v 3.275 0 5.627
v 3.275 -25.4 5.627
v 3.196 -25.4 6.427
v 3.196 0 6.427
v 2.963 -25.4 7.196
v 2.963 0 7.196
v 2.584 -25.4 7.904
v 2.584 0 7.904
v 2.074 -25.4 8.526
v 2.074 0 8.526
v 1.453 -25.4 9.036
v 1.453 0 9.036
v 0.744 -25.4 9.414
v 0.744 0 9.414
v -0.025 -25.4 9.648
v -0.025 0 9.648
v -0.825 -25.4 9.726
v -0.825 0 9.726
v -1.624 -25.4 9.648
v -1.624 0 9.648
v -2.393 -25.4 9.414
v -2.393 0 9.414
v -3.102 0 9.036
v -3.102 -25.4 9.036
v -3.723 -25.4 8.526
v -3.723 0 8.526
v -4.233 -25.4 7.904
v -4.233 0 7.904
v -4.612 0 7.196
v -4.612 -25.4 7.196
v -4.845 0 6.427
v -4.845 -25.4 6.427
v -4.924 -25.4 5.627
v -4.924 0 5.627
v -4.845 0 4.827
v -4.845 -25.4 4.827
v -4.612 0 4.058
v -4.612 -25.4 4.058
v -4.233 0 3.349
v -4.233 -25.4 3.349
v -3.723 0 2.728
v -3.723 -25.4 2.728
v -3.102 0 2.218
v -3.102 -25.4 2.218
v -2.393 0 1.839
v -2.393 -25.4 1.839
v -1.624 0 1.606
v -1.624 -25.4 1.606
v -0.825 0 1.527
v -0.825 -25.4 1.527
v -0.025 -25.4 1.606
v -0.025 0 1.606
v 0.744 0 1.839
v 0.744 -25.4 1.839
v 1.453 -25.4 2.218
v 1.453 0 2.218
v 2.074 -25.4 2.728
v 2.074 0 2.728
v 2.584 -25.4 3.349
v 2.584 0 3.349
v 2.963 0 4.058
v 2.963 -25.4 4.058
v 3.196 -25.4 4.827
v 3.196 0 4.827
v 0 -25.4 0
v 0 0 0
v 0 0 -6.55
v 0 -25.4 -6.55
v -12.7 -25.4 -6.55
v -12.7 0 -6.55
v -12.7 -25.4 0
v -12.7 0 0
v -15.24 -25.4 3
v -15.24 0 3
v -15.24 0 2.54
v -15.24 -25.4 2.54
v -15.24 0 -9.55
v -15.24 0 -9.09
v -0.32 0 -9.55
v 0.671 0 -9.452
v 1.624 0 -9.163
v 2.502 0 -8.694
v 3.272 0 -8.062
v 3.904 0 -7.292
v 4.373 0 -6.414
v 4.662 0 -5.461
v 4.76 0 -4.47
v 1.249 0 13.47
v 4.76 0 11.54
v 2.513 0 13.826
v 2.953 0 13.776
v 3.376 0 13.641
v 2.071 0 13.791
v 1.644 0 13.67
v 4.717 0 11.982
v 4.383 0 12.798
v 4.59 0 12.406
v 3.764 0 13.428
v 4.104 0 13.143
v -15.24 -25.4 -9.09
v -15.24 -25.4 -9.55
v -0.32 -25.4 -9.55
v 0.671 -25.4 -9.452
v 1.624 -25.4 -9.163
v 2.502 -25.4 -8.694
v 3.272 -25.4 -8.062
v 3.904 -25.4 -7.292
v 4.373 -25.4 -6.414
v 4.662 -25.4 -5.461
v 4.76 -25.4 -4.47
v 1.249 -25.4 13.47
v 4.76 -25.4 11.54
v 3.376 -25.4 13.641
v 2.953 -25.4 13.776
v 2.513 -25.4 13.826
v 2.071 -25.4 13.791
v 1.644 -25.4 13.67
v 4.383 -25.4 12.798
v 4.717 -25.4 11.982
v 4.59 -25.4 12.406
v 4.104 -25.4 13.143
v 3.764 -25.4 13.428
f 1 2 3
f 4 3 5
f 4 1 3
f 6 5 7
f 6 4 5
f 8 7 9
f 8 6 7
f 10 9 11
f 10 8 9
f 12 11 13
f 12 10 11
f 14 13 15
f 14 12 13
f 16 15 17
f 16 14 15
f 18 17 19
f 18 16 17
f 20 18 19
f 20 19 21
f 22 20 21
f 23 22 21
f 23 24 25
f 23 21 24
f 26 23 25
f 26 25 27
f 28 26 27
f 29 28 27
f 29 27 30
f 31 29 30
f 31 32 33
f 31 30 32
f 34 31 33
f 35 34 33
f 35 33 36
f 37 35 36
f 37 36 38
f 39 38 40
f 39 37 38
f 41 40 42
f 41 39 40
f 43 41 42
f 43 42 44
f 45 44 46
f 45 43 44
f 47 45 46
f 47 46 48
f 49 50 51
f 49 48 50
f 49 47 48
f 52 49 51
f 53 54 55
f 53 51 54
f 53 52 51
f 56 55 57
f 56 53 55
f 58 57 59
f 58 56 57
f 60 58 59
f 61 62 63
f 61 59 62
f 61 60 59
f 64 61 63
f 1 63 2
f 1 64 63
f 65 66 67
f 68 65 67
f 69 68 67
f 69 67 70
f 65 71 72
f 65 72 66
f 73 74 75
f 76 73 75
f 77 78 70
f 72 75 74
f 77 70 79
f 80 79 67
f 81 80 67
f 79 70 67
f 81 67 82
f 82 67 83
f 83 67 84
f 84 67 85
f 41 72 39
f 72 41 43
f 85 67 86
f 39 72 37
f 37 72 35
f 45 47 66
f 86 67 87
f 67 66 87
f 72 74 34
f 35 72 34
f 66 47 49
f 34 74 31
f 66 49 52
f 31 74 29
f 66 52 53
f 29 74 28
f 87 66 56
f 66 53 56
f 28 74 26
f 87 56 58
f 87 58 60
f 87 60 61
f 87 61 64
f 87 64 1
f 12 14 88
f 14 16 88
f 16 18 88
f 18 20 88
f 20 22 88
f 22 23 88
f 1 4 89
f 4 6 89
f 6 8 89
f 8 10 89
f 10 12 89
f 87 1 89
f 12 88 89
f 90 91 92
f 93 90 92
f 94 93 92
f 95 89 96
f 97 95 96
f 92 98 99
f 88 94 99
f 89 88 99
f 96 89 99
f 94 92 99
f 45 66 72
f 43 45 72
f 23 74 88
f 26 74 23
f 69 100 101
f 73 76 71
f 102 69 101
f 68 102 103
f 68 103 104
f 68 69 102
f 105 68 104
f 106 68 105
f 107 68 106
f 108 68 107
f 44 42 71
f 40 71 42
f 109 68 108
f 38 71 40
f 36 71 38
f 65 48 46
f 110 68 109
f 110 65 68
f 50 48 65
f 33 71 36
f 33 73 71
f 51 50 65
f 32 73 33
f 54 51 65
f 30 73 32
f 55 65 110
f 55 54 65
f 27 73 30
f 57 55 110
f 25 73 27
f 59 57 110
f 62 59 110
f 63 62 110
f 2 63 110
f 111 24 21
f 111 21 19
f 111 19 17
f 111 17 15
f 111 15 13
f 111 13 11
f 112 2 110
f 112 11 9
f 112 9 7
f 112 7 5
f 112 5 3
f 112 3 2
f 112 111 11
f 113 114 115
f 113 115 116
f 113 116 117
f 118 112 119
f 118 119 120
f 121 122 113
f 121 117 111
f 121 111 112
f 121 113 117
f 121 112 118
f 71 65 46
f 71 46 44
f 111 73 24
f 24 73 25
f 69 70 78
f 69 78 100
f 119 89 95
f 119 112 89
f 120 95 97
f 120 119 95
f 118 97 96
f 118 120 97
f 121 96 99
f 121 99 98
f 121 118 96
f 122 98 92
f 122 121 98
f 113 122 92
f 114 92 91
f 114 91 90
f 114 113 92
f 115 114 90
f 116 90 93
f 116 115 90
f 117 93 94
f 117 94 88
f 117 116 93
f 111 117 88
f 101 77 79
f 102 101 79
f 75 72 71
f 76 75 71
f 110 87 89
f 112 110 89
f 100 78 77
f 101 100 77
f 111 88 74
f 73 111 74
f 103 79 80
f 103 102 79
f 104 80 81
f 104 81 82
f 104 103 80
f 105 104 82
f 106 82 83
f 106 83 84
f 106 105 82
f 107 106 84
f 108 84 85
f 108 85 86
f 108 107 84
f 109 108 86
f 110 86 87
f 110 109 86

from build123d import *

# Parameters (mm, degrees)
F1_DEPTH      = 25.4
F2_DEPTH      = 25.4
F3_R          = 5.08
F4_R          = 2.286
F5_SIZE       = 2.54
F6_R          = 4.0996644409
F7_DEPTH      = 25.4
F7_DEPTH_BACK = 254


with BuildPart() as f1:
    # F0 (on Front) → F1 (new body)
    with BuildSketch(Plane.XZ):
        Polygon((-15.24, 0), (0, 0), (0, -6.55), (-15.24, -6.55), (-15.24, -9.55), (4.76, -9.55), (4.76, 3), (-15.24, 3), align=None)
    extrude(amount=F1_DEPTH)

    # F0 (on Front) → F2 (join)
    with BuildSketch(Plane.XZ):
        Polygon((4.76, 15.7), (-15.24, 3), (4.76, 3), align=None)
    extrude(amount=F2_DEPTH)

    # F3
    f3_edges = [f1.edges().sort_by_distance(p)[0] for p in [
        (4.76, -12.7, -9.55),
    ]]
    fillet(f3_edges, radius=F3_R)

    # F4
    f4_edges = [f1.edges().sort_by_distance(p)[0] for p in [
        (4.76, -12.7, 15.7),
    ]]
    fillet(f4_edges, radius=F4_R)

    # F5
    f5_edges = [f1.edges().sort_by_distance(p)[0] for p in [
        (-15.24, -12.7, 0),
        (-15.24, -12.7, -6.55),
    ]]
    chamfer(f5_edges, length=F5_SIZE)

    # F6 (on Front) → F7 (cut, two sides)
    with BuildSketch(Plane.XZ) as f7_sk:
        with Locations((-0.8245132631, 5.626801867)):
            Circle(F6_R)
    extrude(amount=-F7_DEPTH, mode=Mode.SUBTRACT)
    extrude(f7_sk.sketch, amount=F7_DEPTH_BACK, mode=Mode.SUBTRACT)


solid = f1.part
